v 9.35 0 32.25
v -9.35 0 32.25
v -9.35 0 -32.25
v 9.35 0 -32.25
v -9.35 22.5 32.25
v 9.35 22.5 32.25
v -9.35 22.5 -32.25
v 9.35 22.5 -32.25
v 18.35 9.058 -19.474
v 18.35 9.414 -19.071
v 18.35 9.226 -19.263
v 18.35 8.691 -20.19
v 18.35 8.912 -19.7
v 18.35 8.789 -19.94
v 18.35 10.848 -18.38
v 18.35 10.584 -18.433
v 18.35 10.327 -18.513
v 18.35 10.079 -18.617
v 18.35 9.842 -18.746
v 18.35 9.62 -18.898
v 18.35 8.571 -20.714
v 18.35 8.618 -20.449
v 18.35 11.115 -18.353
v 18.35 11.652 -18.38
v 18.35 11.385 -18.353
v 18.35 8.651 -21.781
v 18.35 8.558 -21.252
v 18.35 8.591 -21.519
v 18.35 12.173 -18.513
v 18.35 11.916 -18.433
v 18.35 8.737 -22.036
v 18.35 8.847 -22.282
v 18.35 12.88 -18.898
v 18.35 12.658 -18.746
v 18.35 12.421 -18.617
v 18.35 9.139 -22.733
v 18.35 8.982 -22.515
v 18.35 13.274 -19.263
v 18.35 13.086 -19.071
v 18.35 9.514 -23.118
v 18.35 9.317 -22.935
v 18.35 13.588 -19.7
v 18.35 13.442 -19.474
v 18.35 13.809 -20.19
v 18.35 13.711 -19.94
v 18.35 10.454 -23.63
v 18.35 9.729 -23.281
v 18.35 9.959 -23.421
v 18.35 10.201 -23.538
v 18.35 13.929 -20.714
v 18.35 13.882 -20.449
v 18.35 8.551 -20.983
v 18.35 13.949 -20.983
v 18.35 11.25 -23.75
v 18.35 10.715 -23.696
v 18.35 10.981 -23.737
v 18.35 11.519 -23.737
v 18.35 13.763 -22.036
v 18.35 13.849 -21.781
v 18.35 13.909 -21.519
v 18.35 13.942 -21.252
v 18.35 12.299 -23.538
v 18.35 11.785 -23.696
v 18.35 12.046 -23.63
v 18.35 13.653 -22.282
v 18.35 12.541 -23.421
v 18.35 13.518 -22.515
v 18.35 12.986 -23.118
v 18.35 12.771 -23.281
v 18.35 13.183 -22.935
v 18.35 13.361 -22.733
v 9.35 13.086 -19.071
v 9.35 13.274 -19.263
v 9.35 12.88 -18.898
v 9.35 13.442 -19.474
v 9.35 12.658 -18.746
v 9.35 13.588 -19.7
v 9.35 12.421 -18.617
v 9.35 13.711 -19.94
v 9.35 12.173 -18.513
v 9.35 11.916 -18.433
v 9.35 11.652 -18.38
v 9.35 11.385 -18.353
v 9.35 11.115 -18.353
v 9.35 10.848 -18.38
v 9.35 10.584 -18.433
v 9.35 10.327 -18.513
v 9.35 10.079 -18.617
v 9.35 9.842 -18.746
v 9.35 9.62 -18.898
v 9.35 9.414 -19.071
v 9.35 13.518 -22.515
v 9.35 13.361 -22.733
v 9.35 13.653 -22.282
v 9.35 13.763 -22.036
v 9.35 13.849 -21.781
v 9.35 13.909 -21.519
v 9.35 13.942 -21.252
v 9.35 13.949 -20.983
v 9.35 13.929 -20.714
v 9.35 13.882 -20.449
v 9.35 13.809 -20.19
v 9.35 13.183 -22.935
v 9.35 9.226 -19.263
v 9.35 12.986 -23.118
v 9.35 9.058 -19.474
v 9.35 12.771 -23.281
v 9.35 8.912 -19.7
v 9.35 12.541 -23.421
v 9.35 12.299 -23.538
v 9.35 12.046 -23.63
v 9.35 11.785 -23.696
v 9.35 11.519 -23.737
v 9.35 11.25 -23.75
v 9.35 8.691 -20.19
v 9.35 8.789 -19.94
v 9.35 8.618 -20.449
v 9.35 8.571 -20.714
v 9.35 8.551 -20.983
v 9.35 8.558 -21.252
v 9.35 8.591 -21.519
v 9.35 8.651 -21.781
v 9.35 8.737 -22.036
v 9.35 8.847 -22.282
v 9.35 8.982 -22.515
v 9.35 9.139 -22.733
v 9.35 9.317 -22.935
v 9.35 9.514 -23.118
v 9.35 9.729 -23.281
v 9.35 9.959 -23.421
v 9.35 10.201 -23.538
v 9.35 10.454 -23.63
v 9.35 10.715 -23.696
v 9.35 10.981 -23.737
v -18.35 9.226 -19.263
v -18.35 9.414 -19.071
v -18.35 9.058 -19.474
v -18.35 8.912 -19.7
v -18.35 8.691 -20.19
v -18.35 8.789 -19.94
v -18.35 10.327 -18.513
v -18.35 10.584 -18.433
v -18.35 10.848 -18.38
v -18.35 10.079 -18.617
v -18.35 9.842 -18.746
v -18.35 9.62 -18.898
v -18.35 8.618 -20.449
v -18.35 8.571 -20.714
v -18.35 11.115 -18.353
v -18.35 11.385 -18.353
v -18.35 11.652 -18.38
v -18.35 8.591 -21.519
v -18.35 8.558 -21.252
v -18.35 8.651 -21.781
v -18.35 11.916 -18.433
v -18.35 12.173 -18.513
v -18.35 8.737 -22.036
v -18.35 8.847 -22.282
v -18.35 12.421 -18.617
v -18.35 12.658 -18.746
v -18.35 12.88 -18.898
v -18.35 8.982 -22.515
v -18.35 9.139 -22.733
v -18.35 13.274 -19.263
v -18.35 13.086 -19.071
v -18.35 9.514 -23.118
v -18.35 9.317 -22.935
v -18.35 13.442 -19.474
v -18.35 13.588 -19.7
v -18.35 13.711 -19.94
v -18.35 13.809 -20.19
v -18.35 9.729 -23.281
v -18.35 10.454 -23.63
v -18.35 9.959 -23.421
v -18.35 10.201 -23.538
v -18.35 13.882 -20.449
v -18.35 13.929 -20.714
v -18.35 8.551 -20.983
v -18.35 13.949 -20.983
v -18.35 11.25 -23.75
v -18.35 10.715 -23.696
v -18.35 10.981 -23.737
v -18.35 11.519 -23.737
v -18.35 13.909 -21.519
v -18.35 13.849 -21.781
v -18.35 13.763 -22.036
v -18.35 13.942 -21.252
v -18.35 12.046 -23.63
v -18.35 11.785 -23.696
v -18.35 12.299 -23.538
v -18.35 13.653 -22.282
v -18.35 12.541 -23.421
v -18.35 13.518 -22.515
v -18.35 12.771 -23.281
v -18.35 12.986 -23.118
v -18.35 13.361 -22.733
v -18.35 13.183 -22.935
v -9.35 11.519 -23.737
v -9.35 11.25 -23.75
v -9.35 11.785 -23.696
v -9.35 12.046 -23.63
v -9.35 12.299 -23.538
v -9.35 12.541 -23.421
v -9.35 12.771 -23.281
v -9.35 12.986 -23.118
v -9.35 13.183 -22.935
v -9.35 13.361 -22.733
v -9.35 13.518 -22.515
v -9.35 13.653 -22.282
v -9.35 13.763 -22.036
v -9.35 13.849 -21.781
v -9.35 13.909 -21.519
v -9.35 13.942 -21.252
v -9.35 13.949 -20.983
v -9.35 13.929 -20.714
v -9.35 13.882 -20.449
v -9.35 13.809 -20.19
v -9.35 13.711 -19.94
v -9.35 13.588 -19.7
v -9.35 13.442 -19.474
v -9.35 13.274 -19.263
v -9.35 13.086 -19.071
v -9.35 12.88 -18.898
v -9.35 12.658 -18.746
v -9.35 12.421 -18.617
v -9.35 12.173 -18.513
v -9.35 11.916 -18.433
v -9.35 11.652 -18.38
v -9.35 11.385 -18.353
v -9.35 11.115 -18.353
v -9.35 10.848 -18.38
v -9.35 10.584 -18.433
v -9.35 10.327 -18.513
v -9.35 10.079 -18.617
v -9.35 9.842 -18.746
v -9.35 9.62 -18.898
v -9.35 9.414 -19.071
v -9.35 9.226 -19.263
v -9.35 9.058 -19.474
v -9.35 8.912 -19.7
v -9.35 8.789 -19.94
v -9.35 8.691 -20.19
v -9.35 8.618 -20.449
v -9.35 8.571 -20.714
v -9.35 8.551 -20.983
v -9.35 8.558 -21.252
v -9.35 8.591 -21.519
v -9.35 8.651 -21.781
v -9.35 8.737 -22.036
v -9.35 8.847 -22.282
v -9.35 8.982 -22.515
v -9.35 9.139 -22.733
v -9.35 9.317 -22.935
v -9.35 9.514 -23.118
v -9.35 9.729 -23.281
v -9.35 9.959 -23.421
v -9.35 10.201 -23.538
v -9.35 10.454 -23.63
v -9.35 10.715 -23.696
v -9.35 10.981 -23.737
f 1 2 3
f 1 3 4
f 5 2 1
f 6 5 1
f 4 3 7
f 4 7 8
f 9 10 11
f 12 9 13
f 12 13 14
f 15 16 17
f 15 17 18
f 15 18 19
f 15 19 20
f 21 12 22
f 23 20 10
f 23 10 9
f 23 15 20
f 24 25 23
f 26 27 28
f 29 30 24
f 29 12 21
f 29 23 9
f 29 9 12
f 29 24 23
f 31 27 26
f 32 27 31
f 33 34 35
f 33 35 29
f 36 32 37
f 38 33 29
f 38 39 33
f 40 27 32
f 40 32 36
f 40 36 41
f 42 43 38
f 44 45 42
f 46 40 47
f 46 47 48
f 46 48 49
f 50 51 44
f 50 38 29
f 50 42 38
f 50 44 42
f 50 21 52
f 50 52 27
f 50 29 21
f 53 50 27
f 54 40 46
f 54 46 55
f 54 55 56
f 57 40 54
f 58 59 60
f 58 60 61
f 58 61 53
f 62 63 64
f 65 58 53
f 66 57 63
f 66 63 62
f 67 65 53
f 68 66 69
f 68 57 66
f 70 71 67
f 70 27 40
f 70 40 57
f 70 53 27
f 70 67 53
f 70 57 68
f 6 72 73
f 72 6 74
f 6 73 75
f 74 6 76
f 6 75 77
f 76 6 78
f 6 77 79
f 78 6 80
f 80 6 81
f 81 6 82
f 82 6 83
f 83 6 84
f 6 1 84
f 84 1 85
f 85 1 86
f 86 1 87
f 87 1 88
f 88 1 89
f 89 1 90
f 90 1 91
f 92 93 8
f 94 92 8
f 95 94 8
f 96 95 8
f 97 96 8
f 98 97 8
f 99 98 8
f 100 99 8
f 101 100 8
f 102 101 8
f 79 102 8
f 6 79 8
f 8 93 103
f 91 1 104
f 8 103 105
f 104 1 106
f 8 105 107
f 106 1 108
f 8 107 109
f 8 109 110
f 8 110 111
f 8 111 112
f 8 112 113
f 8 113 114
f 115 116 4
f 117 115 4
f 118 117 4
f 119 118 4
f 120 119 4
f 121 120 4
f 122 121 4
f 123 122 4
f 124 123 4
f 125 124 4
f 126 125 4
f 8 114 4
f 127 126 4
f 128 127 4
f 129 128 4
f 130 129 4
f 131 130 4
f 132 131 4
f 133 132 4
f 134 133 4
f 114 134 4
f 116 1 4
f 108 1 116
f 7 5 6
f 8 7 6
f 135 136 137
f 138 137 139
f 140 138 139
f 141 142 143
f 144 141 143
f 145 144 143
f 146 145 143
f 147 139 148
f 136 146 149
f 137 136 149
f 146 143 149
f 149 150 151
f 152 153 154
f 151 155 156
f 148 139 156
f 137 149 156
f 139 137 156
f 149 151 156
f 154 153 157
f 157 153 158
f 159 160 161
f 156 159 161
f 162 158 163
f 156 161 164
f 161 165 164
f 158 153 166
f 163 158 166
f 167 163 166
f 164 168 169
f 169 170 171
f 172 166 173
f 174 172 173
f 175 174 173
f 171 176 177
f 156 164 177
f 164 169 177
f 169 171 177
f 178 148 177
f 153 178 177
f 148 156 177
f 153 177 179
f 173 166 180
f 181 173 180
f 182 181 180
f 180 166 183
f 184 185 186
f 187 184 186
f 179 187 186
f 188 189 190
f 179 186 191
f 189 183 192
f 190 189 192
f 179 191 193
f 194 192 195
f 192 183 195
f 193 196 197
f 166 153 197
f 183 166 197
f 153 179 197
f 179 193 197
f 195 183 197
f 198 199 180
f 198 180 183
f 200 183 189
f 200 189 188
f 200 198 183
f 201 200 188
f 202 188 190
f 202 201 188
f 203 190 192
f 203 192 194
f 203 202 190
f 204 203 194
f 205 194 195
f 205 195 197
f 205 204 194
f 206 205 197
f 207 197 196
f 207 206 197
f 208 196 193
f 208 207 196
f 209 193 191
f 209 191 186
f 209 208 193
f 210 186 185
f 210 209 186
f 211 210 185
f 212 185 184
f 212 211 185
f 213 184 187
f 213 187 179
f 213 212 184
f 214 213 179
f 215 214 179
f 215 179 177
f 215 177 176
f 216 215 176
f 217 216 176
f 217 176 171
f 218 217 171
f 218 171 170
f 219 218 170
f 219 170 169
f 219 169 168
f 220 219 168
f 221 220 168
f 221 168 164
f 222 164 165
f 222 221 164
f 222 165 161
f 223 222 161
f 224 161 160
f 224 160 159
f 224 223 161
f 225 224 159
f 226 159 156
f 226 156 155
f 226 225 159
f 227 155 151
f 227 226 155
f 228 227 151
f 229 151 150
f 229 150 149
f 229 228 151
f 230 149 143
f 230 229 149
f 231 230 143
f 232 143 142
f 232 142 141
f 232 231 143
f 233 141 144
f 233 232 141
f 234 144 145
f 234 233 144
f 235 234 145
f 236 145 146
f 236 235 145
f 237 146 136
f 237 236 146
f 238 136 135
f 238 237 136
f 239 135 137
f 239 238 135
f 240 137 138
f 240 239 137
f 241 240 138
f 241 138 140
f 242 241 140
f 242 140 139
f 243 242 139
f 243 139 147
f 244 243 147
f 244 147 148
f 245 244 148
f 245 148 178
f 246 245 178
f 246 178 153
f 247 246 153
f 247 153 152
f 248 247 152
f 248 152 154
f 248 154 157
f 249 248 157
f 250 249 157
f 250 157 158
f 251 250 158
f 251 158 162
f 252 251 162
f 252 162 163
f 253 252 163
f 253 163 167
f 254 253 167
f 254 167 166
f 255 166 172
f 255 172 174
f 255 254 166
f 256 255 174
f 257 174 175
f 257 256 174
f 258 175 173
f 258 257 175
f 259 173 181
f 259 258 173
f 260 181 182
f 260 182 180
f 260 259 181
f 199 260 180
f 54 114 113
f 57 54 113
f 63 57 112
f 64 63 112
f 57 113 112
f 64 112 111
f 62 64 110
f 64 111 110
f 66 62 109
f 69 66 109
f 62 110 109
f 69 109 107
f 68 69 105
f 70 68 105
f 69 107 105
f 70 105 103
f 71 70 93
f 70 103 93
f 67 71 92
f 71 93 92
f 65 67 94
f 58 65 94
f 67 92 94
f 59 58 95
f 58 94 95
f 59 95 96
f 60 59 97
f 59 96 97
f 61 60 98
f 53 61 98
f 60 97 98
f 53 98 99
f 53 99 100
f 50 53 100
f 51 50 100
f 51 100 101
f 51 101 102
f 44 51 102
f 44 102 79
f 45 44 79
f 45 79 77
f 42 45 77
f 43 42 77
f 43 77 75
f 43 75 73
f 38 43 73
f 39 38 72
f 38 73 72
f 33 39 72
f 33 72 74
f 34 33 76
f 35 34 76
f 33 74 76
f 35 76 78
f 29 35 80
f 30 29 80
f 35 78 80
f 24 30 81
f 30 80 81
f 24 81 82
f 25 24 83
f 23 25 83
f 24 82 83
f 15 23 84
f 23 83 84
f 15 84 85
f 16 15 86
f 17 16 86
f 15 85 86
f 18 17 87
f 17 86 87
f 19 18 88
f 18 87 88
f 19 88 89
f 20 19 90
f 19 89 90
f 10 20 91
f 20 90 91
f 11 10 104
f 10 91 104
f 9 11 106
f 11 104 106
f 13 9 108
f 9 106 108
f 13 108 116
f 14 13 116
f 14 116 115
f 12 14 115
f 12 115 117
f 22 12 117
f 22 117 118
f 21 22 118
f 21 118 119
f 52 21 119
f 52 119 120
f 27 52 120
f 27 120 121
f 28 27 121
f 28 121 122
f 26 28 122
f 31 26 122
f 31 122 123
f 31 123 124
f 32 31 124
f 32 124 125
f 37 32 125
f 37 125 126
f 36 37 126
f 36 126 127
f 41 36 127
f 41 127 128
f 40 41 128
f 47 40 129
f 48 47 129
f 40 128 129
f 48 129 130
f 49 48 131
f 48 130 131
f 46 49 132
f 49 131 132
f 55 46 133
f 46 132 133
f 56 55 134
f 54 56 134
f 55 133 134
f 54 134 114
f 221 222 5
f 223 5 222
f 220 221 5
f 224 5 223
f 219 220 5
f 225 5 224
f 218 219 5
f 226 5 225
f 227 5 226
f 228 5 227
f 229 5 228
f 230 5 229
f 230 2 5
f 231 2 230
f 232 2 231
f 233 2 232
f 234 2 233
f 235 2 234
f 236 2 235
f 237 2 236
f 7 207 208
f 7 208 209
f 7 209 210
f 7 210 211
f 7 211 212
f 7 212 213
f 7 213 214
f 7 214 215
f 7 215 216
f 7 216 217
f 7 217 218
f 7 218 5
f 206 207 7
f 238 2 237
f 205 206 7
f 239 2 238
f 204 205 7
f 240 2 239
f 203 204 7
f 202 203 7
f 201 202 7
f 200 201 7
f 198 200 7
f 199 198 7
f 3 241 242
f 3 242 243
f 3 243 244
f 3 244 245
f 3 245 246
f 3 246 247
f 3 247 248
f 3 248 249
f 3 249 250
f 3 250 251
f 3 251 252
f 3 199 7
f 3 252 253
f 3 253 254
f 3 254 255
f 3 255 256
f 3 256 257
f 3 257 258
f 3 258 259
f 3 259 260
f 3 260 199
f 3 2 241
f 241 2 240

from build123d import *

# Parameters (mm, degrees)
SKETCH1_W           = 18.7
SKETCH1_H           = 64.5
BOSS_EXTRUDE1_DEPTH = 22.5
SKETCH2_R           = 2.7
BOSS_EXTRUDE2_DEPTH = 9


with BuildPart() as part:
    # Sketch1 → Boss-Extrude1 (new body)
    with BuildSketch(Plane(origin=(0, 0, 0), x_dir=(1, 0, 0), z_dir=(0, 1, 0))):
        Rectangle(SKETCH1_W, SKETCH1_H)
    extrude(amount=BOSS_EXTRUDE1_DEPTH)

    # Sketch2 → Boss-Extrude2 (add)
    with BuildSketch(Plane(origin=(9.35, 0, 0), x_dir=(0, 0, -1), z_dir=(1, 0, 0))):
        with Locations((21.05, 11.25)):
            Circle(SKETCH2_R)
    boss_extrude2 = extrude(amount=BOSS_EXTRUDE2_DEPTH)

    # Mirror1: Boss-Extrude2 across plane
    add(boss_extrude2.mirror(Plane(origin=(0, 0, 0), x_dir=(0, 0, 1), z_dir=(1, 0, 0))))


solid = part.part
